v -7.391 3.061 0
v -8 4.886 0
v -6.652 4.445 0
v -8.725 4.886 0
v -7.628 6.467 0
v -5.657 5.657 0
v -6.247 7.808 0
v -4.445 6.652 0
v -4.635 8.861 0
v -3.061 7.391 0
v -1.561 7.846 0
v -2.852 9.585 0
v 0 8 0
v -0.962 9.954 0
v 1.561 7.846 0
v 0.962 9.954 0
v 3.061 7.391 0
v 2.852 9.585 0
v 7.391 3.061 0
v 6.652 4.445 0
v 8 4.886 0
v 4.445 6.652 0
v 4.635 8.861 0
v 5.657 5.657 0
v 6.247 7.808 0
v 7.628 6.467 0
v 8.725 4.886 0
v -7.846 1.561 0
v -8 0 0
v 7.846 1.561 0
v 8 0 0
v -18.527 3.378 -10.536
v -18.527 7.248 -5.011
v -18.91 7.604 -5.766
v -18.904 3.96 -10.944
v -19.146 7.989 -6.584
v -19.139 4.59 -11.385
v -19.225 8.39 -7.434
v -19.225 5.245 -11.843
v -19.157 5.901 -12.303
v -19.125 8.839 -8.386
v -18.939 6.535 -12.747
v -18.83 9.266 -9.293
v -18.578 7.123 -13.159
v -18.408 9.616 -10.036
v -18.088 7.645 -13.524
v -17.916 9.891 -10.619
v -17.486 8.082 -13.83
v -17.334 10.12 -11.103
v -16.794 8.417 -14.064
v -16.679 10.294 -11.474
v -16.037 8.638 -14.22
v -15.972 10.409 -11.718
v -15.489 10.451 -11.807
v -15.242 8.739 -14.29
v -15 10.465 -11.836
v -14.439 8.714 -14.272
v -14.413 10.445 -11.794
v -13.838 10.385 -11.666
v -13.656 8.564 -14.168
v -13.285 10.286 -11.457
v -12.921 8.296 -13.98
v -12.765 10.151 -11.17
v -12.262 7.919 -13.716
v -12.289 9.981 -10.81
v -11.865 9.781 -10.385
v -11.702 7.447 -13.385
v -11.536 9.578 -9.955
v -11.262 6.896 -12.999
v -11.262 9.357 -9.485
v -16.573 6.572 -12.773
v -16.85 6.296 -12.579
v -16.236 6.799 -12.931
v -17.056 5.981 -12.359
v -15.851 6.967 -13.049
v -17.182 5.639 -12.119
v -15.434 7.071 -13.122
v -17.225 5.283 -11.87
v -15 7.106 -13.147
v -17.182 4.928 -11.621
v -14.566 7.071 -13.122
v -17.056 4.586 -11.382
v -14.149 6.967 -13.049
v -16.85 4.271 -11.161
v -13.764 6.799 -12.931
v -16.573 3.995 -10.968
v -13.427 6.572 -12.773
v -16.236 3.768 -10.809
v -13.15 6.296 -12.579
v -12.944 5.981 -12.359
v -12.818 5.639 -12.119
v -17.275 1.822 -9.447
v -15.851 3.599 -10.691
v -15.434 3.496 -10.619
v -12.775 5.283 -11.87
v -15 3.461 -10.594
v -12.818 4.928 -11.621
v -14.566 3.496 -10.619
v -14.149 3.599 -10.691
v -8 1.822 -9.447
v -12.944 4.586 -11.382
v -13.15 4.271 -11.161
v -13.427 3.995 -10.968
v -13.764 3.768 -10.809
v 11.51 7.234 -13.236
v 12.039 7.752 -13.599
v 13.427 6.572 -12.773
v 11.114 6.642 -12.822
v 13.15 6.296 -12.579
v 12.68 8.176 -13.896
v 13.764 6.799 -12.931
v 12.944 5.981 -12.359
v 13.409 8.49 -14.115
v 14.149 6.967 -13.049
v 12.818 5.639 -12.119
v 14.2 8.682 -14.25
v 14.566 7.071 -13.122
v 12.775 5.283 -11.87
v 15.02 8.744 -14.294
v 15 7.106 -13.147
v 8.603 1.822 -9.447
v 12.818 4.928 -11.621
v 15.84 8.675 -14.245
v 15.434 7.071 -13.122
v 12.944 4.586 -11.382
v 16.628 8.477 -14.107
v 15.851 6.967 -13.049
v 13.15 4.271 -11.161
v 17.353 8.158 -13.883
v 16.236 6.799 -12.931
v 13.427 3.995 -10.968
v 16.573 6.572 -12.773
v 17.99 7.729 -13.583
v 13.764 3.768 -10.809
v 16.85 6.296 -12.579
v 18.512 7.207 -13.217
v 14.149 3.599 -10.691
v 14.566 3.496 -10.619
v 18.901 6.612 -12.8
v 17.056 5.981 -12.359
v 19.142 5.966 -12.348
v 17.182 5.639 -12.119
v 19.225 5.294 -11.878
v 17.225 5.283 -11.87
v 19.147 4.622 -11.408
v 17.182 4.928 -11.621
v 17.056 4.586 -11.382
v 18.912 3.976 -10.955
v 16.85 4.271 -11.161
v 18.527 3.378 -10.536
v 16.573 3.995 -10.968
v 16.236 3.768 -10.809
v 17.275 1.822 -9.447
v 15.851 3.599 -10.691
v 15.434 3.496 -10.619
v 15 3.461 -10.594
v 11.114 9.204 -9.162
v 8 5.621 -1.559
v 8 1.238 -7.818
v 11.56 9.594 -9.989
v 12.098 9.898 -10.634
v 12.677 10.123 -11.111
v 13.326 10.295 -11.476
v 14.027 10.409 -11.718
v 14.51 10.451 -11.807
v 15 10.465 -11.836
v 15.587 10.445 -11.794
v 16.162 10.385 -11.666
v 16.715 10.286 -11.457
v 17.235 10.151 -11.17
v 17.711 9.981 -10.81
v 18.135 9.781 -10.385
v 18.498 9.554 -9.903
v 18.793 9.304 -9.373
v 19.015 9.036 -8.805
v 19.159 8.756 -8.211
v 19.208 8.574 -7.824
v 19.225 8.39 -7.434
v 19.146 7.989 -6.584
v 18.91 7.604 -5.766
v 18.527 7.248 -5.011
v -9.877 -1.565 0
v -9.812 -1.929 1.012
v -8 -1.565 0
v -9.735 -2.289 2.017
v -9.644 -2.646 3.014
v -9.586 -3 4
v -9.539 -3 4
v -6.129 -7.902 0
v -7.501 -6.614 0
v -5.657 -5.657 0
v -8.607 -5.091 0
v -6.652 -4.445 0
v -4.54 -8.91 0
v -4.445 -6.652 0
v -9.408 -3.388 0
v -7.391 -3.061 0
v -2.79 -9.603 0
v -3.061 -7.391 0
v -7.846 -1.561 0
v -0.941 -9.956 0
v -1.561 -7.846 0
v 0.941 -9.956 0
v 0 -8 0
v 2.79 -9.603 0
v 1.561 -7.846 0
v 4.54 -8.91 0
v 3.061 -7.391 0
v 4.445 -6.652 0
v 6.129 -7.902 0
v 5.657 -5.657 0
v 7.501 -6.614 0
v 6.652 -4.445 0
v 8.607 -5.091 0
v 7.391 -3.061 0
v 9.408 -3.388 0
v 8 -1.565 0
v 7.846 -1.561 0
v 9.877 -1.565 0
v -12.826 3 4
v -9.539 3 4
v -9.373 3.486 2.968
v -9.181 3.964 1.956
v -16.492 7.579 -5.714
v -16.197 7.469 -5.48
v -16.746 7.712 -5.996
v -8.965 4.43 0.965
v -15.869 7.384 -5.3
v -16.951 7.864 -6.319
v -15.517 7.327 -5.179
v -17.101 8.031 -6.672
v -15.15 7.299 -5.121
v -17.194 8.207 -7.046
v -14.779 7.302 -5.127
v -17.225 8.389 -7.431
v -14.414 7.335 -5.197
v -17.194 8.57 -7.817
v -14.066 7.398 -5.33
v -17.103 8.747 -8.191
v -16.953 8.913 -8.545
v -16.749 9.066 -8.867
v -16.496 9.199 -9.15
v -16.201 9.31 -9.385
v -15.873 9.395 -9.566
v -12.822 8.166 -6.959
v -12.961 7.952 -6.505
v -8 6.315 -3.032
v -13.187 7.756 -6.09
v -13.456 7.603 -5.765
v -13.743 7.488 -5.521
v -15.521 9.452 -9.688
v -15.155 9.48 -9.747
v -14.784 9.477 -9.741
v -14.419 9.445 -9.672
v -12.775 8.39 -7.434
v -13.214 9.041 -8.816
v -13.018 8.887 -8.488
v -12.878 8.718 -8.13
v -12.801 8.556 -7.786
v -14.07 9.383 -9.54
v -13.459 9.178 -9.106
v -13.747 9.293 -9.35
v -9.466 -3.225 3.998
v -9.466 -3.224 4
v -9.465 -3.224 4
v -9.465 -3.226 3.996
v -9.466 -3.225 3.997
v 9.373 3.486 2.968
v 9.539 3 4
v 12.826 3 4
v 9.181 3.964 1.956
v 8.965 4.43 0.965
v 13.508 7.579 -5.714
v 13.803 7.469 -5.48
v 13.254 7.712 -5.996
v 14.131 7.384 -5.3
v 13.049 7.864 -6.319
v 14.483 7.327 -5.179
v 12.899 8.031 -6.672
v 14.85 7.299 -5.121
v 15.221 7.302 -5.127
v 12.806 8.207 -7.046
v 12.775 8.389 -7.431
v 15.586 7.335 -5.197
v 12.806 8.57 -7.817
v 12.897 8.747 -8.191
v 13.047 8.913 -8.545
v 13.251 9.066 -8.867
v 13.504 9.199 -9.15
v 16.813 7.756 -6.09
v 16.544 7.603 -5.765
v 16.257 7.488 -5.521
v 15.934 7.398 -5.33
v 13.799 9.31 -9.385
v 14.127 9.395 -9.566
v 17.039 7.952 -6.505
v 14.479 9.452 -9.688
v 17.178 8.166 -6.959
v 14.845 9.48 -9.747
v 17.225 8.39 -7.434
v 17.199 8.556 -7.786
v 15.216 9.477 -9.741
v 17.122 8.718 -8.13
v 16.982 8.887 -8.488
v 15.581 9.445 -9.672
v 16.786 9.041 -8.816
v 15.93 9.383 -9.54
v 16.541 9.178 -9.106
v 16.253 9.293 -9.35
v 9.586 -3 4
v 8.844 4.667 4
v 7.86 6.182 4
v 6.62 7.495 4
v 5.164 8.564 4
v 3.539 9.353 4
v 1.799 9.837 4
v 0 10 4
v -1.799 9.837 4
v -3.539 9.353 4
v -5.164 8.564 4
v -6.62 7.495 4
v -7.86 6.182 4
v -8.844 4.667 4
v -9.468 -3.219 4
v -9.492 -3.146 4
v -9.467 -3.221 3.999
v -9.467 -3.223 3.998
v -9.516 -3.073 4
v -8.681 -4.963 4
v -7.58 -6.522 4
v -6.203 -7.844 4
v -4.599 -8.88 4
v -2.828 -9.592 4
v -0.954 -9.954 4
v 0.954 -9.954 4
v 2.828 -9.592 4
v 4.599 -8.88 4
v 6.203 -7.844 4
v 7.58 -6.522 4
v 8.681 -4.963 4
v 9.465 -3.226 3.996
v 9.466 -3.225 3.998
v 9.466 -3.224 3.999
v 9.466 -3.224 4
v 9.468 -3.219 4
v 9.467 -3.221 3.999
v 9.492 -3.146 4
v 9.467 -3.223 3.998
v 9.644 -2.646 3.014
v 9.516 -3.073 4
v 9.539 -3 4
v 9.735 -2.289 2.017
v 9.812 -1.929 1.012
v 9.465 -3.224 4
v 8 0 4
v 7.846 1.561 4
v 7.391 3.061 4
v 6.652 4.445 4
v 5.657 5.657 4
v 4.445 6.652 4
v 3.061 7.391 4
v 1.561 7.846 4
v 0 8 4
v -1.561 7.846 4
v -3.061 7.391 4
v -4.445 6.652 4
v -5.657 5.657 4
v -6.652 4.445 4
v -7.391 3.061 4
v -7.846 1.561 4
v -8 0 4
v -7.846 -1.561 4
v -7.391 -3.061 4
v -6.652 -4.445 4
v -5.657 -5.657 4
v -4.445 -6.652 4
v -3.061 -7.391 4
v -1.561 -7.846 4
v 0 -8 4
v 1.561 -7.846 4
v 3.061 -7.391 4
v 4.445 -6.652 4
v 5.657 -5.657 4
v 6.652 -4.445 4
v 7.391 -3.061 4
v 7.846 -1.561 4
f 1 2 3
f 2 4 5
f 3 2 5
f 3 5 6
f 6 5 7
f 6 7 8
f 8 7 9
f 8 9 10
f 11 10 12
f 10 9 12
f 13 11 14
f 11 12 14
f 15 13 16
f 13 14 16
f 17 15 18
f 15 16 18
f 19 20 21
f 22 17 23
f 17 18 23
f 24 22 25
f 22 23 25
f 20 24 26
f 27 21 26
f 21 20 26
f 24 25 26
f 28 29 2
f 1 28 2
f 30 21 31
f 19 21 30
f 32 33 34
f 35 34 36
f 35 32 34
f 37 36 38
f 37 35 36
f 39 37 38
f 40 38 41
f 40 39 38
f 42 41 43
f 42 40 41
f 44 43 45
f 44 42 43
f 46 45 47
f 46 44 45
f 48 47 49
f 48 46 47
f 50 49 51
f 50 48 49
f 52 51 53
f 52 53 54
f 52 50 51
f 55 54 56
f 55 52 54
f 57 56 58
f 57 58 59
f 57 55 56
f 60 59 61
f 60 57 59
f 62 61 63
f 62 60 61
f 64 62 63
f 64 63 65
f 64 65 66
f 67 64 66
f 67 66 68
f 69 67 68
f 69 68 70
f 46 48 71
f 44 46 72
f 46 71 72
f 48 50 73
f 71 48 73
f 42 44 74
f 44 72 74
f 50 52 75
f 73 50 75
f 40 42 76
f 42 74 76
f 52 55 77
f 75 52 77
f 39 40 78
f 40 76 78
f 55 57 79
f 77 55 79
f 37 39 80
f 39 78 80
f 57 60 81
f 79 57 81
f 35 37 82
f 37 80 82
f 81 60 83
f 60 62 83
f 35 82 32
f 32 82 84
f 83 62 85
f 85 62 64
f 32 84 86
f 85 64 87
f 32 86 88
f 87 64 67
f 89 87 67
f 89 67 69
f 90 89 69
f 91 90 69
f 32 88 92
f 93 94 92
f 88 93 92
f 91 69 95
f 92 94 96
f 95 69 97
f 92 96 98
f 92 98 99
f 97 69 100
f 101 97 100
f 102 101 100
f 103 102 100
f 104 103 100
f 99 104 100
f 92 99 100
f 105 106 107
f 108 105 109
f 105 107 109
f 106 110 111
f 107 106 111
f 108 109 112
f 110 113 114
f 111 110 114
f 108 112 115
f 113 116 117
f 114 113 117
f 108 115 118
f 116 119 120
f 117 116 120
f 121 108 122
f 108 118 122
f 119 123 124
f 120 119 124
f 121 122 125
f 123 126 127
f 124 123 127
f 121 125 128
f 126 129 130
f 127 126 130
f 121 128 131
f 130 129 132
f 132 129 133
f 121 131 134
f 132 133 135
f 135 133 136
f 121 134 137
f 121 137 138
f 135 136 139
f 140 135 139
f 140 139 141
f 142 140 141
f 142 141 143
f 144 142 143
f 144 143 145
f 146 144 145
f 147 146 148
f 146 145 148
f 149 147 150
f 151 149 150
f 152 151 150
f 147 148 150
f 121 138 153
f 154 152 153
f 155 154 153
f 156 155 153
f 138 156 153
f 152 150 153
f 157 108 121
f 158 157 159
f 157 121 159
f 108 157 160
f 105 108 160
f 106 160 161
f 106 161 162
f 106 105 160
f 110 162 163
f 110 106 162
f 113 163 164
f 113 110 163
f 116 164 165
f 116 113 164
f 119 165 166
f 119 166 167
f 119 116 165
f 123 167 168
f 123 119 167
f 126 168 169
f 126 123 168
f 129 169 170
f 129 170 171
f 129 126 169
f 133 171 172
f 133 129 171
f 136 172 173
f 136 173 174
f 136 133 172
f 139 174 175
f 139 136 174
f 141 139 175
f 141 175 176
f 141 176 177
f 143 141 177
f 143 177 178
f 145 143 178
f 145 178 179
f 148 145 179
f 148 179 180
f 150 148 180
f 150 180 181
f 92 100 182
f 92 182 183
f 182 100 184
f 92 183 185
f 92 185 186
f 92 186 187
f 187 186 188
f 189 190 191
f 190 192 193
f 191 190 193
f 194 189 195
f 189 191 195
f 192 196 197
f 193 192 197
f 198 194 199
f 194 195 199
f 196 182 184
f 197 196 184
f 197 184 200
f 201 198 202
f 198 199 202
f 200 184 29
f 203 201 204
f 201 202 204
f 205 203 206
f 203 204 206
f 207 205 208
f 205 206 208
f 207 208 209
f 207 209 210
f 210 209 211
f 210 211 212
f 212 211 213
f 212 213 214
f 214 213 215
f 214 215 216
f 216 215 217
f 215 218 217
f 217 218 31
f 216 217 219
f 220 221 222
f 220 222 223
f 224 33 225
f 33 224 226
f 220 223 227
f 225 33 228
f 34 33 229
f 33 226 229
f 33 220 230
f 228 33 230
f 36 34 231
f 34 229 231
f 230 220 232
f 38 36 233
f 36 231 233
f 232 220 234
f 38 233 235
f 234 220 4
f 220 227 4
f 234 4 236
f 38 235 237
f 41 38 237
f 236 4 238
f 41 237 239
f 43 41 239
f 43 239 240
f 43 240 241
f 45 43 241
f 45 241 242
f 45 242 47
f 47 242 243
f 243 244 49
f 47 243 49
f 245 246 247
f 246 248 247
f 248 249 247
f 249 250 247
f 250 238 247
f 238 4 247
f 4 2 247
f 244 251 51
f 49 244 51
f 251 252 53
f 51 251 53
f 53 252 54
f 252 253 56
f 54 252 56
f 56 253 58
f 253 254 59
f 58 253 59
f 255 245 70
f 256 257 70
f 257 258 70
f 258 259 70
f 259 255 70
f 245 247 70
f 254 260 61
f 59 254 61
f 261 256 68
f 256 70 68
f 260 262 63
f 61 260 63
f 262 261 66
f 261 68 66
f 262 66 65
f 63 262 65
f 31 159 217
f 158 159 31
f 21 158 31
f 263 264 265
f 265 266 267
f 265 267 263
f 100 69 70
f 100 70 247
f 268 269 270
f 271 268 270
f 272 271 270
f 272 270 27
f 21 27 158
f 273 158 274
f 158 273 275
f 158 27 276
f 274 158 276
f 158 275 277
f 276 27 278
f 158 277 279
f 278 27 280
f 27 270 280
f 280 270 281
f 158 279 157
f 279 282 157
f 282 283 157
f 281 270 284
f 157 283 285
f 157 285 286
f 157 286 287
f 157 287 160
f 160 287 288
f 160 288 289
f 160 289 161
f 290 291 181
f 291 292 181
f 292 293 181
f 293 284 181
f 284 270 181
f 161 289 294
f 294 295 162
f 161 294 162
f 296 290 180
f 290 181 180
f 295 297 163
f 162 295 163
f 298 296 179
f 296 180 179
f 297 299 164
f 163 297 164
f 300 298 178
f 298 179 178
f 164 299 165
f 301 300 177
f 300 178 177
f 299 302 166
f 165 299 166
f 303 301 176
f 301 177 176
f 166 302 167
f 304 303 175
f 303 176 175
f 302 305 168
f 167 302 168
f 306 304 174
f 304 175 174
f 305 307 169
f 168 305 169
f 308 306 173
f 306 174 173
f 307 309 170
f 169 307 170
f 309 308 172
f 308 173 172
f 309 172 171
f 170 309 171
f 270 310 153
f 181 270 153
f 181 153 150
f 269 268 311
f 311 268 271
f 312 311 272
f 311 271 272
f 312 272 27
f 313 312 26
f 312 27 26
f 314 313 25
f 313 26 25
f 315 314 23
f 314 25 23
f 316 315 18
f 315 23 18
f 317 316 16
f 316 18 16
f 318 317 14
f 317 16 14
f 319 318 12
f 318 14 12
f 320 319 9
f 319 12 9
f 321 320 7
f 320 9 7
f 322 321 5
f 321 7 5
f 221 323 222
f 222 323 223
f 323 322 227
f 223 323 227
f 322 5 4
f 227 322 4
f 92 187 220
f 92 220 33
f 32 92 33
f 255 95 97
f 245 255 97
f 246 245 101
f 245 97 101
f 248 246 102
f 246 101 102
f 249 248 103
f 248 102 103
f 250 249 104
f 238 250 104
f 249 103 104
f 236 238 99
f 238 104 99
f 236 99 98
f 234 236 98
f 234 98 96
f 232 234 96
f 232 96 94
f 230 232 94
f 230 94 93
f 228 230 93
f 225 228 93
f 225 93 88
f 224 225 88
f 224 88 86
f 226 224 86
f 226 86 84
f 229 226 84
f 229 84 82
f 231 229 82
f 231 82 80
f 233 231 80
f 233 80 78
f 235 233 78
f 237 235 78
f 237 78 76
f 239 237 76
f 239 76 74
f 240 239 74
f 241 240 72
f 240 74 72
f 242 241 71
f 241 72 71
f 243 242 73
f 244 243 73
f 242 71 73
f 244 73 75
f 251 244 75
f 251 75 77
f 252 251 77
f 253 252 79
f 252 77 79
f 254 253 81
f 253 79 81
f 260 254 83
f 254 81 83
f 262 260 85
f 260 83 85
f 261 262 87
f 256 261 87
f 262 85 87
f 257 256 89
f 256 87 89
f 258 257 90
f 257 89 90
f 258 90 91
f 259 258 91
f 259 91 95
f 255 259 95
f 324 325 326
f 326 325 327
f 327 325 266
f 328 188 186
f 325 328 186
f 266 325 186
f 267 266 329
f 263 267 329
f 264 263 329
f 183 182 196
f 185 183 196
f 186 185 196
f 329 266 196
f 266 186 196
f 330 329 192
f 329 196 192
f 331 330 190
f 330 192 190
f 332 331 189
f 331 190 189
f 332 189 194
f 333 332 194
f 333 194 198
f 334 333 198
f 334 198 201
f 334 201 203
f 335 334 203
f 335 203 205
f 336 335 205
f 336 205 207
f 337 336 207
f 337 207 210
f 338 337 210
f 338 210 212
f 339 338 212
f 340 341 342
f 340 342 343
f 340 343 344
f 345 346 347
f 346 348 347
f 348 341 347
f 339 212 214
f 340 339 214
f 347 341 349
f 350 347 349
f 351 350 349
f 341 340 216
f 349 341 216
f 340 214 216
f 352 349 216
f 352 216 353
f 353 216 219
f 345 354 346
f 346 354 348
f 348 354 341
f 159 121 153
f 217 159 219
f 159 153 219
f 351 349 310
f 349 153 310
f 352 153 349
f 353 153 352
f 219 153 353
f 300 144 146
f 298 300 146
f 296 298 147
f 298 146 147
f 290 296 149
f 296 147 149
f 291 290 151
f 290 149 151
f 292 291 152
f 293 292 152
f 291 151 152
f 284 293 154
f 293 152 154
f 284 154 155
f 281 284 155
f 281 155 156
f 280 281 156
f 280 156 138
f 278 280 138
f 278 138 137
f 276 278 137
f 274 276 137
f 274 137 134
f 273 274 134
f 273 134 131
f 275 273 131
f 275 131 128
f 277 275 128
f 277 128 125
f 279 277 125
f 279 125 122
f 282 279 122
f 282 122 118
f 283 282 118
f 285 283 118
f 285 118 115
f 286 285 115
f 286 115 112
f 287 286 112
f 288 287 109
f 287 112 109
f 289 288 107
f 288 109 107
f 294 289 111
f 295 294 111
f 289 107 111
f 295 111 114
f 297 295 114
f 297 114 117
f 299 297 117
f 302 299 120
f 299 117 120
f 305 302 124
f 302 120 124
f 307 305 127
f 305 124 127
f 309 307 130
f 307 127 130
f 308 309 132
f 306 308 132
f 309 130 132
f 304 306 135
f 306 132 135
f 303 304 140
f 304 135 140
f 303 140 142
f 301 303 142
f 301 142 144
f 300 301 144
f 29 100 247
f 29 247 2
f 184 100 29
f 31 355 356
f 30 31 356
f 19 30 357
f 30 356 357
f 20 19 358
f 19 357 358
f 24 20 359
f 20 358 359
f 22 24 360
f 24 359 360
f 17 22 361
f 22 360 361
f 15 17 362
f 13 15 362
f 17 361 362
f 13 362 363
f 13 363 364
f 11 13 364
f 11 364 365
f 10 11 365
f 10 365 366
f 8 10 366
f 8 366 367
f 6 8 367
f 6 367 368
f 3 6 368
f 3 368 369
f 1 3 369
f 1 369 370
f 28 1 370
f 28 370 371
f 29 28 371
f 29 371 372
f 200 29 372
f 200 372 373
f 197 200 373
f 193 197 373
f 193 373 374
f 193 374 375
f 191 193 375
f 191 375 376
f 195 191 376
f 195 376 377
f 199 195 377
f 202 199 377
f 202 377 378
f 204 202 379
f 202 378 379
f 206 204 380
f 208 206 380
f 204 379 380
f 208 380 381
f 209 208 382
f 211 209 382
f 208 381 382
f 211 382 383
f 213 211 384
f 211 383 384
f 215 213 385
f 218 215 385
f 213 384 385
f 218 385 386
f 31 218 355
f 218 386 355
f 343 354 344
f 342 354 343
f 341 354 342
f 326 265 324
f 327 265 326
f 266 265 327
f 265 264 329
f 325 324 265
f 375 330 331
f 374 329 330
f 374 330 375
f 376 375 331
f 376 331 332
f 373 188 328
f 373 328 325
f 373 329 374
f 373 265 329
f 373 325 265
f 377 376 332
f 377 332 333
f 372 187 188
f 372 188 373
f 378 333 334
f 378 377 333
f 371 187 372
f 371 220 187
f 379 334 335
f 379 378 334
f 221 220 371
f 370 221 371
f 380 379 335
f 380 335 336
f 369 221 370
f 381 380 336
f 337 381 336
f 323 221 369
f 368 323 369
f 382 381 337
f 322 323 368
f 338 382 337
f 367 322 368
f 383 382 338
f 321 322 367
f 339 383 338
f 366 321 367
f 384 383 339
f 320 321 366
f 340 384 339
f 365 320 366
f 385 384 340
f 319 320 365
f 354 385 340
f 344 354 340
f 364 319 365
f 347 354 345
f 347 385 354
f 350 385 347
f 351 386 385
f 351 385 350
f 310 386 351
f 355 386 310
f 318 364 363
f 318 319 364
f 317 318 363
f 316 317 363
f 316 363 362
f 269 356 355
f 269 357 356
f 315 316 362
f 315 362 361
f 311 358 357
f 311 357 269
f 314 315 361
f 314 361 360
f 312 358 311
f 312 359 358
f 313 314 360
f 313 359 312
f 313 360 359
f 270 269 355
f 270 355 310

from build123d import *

# Parameters (mm, degrees)
SKETCH_R             = 10
PAD_DEPTH            = 4
PAD001_DEPTH         = 19.225
PAD001_DEPTH_BACK    = 19.225
SKETCH002_W          = 16
SKETCH002_H          = 14.708531
POCKET_DEPTH         = 100
POCKET_DEPTH_BACK    = 100
SKETCH005_R          = 2.225
POCKET002_DEPTH      = 100
POCKET002_DEPTH_BACK = 100
SKETCH006_R          = 8
POCKET003_DEPTH      = 18.2946687632


with BuildPart() as part:
    # Sketch → Pad (new body)
    with BuildSketch(Plane.XY):
        Circle(SKETCH_R)
    extrude(amount=PAD_DEPTH)

    # Sketch001 → Pad001 (join, two sides)
    with BuildSketch(Plane.YZ) as pad001_sk:
        Polygon((-3, 4), (3, 4), (10.4649812857, -11.8362126303), (8.7442519767, -14.2936687632), (1.8224172024, -9.446947876), align=None)
    extrude(amount=PAD001_DEPTH)
    extrude(pad001_sk.sketch, amount=-PAD001_DEPTH_BACK)

    # Sketch002 → Pocket (cut, two sides)
    with BuildSketch(Plane.XZ) as pocket_sk:
        with Locations((0, -7.3542655)):
            Rectangle(SKETCH002_W, SKETCH002_H)
    extrude(amount=-POCKET_DEPTH, mode=Mode.SUBTRACT)
    extrude(pocket_sk.sketch, amount=POCKET_DEPTH_BACK, mode=Mode.SUBTRACT)

    # Sketch005 (on Face5 of Pocket) → Pocket002 (cut, two sides)
    with BuildSketch(Plane(origin=(0, -3.8390566992, -5.4827411727), x_dir=(1, 0, 0), z_dir=(0, -0.5735764364, -0.8191520443))) as pocket002_sk:
        with Locations((-15, -11.136383474)):
            Circle(SKETCH005_R)
        with Locations((15, -11.136383474)):
            Circle(SKETCH005_R)
        with BuildLine():
            ThreePointArc((-18.5274170715, -8.8108827099), (-17.1496679718, -14.7736286694), (-11.2616841653, -13.1050428452))
            Line((-11.2616841653, -13.1050428452), (-8, -6.911383474))
            Line((-8, -6.911383474), (-8, -15.402658))
            Line((-8, -15.402658), (8, -15.402658))
            Line((8, -15.402658), (8, -5.4984980053))
            Line((11.1141301433, -12.7948889631), (8, -5.4984980053))
            ThreePointArc((11.1141301433, -12.7948889631), (17.0000496384, -14.8579995805), (18.5274170715, -8.8108827099))
            Line((9.4653449469, 4.9348482776), (18.5274170715, -8.8108827099))
            Line((9.4653449469, 4.9348482776), (21.017342039, 4.9348482776))
            Line((21.017342039, -22.489232832), (21.017342039, 4.9348482776))
            Line((-21.017342039, -22.489232832), (21.017342039, -22.489232832))
            Line((-21.017342039, 4.9348482776), (-21.017342039, -22.489232832))
            Line((-21.017342039, 4.9348482776), (-9.4653449469, 4.9348482776))
            Line((-9.4653449469, 4.9348482776), (-18.5274170715, -8.8108827099))
        make_face()
    extrude(amount=-POCKET002_DEPTH, mode=Mode.SUBTRACT)
    extrude(pocket002_sk.sketch, amount=POCKET002_DEPTH_BACK, mode=Mode.SUBTRACT)

    # Sketch006 (on Face23 of Pocket002) → Pocket003 (cut, through all)
    with BuildSketch(Plane.XY.offset(4)):
        Circle(SKETCH006_R)
    extrude(amount=-POCKET003_DEPTH, mode=Mode.SUBTRACT)


solid = part.part
